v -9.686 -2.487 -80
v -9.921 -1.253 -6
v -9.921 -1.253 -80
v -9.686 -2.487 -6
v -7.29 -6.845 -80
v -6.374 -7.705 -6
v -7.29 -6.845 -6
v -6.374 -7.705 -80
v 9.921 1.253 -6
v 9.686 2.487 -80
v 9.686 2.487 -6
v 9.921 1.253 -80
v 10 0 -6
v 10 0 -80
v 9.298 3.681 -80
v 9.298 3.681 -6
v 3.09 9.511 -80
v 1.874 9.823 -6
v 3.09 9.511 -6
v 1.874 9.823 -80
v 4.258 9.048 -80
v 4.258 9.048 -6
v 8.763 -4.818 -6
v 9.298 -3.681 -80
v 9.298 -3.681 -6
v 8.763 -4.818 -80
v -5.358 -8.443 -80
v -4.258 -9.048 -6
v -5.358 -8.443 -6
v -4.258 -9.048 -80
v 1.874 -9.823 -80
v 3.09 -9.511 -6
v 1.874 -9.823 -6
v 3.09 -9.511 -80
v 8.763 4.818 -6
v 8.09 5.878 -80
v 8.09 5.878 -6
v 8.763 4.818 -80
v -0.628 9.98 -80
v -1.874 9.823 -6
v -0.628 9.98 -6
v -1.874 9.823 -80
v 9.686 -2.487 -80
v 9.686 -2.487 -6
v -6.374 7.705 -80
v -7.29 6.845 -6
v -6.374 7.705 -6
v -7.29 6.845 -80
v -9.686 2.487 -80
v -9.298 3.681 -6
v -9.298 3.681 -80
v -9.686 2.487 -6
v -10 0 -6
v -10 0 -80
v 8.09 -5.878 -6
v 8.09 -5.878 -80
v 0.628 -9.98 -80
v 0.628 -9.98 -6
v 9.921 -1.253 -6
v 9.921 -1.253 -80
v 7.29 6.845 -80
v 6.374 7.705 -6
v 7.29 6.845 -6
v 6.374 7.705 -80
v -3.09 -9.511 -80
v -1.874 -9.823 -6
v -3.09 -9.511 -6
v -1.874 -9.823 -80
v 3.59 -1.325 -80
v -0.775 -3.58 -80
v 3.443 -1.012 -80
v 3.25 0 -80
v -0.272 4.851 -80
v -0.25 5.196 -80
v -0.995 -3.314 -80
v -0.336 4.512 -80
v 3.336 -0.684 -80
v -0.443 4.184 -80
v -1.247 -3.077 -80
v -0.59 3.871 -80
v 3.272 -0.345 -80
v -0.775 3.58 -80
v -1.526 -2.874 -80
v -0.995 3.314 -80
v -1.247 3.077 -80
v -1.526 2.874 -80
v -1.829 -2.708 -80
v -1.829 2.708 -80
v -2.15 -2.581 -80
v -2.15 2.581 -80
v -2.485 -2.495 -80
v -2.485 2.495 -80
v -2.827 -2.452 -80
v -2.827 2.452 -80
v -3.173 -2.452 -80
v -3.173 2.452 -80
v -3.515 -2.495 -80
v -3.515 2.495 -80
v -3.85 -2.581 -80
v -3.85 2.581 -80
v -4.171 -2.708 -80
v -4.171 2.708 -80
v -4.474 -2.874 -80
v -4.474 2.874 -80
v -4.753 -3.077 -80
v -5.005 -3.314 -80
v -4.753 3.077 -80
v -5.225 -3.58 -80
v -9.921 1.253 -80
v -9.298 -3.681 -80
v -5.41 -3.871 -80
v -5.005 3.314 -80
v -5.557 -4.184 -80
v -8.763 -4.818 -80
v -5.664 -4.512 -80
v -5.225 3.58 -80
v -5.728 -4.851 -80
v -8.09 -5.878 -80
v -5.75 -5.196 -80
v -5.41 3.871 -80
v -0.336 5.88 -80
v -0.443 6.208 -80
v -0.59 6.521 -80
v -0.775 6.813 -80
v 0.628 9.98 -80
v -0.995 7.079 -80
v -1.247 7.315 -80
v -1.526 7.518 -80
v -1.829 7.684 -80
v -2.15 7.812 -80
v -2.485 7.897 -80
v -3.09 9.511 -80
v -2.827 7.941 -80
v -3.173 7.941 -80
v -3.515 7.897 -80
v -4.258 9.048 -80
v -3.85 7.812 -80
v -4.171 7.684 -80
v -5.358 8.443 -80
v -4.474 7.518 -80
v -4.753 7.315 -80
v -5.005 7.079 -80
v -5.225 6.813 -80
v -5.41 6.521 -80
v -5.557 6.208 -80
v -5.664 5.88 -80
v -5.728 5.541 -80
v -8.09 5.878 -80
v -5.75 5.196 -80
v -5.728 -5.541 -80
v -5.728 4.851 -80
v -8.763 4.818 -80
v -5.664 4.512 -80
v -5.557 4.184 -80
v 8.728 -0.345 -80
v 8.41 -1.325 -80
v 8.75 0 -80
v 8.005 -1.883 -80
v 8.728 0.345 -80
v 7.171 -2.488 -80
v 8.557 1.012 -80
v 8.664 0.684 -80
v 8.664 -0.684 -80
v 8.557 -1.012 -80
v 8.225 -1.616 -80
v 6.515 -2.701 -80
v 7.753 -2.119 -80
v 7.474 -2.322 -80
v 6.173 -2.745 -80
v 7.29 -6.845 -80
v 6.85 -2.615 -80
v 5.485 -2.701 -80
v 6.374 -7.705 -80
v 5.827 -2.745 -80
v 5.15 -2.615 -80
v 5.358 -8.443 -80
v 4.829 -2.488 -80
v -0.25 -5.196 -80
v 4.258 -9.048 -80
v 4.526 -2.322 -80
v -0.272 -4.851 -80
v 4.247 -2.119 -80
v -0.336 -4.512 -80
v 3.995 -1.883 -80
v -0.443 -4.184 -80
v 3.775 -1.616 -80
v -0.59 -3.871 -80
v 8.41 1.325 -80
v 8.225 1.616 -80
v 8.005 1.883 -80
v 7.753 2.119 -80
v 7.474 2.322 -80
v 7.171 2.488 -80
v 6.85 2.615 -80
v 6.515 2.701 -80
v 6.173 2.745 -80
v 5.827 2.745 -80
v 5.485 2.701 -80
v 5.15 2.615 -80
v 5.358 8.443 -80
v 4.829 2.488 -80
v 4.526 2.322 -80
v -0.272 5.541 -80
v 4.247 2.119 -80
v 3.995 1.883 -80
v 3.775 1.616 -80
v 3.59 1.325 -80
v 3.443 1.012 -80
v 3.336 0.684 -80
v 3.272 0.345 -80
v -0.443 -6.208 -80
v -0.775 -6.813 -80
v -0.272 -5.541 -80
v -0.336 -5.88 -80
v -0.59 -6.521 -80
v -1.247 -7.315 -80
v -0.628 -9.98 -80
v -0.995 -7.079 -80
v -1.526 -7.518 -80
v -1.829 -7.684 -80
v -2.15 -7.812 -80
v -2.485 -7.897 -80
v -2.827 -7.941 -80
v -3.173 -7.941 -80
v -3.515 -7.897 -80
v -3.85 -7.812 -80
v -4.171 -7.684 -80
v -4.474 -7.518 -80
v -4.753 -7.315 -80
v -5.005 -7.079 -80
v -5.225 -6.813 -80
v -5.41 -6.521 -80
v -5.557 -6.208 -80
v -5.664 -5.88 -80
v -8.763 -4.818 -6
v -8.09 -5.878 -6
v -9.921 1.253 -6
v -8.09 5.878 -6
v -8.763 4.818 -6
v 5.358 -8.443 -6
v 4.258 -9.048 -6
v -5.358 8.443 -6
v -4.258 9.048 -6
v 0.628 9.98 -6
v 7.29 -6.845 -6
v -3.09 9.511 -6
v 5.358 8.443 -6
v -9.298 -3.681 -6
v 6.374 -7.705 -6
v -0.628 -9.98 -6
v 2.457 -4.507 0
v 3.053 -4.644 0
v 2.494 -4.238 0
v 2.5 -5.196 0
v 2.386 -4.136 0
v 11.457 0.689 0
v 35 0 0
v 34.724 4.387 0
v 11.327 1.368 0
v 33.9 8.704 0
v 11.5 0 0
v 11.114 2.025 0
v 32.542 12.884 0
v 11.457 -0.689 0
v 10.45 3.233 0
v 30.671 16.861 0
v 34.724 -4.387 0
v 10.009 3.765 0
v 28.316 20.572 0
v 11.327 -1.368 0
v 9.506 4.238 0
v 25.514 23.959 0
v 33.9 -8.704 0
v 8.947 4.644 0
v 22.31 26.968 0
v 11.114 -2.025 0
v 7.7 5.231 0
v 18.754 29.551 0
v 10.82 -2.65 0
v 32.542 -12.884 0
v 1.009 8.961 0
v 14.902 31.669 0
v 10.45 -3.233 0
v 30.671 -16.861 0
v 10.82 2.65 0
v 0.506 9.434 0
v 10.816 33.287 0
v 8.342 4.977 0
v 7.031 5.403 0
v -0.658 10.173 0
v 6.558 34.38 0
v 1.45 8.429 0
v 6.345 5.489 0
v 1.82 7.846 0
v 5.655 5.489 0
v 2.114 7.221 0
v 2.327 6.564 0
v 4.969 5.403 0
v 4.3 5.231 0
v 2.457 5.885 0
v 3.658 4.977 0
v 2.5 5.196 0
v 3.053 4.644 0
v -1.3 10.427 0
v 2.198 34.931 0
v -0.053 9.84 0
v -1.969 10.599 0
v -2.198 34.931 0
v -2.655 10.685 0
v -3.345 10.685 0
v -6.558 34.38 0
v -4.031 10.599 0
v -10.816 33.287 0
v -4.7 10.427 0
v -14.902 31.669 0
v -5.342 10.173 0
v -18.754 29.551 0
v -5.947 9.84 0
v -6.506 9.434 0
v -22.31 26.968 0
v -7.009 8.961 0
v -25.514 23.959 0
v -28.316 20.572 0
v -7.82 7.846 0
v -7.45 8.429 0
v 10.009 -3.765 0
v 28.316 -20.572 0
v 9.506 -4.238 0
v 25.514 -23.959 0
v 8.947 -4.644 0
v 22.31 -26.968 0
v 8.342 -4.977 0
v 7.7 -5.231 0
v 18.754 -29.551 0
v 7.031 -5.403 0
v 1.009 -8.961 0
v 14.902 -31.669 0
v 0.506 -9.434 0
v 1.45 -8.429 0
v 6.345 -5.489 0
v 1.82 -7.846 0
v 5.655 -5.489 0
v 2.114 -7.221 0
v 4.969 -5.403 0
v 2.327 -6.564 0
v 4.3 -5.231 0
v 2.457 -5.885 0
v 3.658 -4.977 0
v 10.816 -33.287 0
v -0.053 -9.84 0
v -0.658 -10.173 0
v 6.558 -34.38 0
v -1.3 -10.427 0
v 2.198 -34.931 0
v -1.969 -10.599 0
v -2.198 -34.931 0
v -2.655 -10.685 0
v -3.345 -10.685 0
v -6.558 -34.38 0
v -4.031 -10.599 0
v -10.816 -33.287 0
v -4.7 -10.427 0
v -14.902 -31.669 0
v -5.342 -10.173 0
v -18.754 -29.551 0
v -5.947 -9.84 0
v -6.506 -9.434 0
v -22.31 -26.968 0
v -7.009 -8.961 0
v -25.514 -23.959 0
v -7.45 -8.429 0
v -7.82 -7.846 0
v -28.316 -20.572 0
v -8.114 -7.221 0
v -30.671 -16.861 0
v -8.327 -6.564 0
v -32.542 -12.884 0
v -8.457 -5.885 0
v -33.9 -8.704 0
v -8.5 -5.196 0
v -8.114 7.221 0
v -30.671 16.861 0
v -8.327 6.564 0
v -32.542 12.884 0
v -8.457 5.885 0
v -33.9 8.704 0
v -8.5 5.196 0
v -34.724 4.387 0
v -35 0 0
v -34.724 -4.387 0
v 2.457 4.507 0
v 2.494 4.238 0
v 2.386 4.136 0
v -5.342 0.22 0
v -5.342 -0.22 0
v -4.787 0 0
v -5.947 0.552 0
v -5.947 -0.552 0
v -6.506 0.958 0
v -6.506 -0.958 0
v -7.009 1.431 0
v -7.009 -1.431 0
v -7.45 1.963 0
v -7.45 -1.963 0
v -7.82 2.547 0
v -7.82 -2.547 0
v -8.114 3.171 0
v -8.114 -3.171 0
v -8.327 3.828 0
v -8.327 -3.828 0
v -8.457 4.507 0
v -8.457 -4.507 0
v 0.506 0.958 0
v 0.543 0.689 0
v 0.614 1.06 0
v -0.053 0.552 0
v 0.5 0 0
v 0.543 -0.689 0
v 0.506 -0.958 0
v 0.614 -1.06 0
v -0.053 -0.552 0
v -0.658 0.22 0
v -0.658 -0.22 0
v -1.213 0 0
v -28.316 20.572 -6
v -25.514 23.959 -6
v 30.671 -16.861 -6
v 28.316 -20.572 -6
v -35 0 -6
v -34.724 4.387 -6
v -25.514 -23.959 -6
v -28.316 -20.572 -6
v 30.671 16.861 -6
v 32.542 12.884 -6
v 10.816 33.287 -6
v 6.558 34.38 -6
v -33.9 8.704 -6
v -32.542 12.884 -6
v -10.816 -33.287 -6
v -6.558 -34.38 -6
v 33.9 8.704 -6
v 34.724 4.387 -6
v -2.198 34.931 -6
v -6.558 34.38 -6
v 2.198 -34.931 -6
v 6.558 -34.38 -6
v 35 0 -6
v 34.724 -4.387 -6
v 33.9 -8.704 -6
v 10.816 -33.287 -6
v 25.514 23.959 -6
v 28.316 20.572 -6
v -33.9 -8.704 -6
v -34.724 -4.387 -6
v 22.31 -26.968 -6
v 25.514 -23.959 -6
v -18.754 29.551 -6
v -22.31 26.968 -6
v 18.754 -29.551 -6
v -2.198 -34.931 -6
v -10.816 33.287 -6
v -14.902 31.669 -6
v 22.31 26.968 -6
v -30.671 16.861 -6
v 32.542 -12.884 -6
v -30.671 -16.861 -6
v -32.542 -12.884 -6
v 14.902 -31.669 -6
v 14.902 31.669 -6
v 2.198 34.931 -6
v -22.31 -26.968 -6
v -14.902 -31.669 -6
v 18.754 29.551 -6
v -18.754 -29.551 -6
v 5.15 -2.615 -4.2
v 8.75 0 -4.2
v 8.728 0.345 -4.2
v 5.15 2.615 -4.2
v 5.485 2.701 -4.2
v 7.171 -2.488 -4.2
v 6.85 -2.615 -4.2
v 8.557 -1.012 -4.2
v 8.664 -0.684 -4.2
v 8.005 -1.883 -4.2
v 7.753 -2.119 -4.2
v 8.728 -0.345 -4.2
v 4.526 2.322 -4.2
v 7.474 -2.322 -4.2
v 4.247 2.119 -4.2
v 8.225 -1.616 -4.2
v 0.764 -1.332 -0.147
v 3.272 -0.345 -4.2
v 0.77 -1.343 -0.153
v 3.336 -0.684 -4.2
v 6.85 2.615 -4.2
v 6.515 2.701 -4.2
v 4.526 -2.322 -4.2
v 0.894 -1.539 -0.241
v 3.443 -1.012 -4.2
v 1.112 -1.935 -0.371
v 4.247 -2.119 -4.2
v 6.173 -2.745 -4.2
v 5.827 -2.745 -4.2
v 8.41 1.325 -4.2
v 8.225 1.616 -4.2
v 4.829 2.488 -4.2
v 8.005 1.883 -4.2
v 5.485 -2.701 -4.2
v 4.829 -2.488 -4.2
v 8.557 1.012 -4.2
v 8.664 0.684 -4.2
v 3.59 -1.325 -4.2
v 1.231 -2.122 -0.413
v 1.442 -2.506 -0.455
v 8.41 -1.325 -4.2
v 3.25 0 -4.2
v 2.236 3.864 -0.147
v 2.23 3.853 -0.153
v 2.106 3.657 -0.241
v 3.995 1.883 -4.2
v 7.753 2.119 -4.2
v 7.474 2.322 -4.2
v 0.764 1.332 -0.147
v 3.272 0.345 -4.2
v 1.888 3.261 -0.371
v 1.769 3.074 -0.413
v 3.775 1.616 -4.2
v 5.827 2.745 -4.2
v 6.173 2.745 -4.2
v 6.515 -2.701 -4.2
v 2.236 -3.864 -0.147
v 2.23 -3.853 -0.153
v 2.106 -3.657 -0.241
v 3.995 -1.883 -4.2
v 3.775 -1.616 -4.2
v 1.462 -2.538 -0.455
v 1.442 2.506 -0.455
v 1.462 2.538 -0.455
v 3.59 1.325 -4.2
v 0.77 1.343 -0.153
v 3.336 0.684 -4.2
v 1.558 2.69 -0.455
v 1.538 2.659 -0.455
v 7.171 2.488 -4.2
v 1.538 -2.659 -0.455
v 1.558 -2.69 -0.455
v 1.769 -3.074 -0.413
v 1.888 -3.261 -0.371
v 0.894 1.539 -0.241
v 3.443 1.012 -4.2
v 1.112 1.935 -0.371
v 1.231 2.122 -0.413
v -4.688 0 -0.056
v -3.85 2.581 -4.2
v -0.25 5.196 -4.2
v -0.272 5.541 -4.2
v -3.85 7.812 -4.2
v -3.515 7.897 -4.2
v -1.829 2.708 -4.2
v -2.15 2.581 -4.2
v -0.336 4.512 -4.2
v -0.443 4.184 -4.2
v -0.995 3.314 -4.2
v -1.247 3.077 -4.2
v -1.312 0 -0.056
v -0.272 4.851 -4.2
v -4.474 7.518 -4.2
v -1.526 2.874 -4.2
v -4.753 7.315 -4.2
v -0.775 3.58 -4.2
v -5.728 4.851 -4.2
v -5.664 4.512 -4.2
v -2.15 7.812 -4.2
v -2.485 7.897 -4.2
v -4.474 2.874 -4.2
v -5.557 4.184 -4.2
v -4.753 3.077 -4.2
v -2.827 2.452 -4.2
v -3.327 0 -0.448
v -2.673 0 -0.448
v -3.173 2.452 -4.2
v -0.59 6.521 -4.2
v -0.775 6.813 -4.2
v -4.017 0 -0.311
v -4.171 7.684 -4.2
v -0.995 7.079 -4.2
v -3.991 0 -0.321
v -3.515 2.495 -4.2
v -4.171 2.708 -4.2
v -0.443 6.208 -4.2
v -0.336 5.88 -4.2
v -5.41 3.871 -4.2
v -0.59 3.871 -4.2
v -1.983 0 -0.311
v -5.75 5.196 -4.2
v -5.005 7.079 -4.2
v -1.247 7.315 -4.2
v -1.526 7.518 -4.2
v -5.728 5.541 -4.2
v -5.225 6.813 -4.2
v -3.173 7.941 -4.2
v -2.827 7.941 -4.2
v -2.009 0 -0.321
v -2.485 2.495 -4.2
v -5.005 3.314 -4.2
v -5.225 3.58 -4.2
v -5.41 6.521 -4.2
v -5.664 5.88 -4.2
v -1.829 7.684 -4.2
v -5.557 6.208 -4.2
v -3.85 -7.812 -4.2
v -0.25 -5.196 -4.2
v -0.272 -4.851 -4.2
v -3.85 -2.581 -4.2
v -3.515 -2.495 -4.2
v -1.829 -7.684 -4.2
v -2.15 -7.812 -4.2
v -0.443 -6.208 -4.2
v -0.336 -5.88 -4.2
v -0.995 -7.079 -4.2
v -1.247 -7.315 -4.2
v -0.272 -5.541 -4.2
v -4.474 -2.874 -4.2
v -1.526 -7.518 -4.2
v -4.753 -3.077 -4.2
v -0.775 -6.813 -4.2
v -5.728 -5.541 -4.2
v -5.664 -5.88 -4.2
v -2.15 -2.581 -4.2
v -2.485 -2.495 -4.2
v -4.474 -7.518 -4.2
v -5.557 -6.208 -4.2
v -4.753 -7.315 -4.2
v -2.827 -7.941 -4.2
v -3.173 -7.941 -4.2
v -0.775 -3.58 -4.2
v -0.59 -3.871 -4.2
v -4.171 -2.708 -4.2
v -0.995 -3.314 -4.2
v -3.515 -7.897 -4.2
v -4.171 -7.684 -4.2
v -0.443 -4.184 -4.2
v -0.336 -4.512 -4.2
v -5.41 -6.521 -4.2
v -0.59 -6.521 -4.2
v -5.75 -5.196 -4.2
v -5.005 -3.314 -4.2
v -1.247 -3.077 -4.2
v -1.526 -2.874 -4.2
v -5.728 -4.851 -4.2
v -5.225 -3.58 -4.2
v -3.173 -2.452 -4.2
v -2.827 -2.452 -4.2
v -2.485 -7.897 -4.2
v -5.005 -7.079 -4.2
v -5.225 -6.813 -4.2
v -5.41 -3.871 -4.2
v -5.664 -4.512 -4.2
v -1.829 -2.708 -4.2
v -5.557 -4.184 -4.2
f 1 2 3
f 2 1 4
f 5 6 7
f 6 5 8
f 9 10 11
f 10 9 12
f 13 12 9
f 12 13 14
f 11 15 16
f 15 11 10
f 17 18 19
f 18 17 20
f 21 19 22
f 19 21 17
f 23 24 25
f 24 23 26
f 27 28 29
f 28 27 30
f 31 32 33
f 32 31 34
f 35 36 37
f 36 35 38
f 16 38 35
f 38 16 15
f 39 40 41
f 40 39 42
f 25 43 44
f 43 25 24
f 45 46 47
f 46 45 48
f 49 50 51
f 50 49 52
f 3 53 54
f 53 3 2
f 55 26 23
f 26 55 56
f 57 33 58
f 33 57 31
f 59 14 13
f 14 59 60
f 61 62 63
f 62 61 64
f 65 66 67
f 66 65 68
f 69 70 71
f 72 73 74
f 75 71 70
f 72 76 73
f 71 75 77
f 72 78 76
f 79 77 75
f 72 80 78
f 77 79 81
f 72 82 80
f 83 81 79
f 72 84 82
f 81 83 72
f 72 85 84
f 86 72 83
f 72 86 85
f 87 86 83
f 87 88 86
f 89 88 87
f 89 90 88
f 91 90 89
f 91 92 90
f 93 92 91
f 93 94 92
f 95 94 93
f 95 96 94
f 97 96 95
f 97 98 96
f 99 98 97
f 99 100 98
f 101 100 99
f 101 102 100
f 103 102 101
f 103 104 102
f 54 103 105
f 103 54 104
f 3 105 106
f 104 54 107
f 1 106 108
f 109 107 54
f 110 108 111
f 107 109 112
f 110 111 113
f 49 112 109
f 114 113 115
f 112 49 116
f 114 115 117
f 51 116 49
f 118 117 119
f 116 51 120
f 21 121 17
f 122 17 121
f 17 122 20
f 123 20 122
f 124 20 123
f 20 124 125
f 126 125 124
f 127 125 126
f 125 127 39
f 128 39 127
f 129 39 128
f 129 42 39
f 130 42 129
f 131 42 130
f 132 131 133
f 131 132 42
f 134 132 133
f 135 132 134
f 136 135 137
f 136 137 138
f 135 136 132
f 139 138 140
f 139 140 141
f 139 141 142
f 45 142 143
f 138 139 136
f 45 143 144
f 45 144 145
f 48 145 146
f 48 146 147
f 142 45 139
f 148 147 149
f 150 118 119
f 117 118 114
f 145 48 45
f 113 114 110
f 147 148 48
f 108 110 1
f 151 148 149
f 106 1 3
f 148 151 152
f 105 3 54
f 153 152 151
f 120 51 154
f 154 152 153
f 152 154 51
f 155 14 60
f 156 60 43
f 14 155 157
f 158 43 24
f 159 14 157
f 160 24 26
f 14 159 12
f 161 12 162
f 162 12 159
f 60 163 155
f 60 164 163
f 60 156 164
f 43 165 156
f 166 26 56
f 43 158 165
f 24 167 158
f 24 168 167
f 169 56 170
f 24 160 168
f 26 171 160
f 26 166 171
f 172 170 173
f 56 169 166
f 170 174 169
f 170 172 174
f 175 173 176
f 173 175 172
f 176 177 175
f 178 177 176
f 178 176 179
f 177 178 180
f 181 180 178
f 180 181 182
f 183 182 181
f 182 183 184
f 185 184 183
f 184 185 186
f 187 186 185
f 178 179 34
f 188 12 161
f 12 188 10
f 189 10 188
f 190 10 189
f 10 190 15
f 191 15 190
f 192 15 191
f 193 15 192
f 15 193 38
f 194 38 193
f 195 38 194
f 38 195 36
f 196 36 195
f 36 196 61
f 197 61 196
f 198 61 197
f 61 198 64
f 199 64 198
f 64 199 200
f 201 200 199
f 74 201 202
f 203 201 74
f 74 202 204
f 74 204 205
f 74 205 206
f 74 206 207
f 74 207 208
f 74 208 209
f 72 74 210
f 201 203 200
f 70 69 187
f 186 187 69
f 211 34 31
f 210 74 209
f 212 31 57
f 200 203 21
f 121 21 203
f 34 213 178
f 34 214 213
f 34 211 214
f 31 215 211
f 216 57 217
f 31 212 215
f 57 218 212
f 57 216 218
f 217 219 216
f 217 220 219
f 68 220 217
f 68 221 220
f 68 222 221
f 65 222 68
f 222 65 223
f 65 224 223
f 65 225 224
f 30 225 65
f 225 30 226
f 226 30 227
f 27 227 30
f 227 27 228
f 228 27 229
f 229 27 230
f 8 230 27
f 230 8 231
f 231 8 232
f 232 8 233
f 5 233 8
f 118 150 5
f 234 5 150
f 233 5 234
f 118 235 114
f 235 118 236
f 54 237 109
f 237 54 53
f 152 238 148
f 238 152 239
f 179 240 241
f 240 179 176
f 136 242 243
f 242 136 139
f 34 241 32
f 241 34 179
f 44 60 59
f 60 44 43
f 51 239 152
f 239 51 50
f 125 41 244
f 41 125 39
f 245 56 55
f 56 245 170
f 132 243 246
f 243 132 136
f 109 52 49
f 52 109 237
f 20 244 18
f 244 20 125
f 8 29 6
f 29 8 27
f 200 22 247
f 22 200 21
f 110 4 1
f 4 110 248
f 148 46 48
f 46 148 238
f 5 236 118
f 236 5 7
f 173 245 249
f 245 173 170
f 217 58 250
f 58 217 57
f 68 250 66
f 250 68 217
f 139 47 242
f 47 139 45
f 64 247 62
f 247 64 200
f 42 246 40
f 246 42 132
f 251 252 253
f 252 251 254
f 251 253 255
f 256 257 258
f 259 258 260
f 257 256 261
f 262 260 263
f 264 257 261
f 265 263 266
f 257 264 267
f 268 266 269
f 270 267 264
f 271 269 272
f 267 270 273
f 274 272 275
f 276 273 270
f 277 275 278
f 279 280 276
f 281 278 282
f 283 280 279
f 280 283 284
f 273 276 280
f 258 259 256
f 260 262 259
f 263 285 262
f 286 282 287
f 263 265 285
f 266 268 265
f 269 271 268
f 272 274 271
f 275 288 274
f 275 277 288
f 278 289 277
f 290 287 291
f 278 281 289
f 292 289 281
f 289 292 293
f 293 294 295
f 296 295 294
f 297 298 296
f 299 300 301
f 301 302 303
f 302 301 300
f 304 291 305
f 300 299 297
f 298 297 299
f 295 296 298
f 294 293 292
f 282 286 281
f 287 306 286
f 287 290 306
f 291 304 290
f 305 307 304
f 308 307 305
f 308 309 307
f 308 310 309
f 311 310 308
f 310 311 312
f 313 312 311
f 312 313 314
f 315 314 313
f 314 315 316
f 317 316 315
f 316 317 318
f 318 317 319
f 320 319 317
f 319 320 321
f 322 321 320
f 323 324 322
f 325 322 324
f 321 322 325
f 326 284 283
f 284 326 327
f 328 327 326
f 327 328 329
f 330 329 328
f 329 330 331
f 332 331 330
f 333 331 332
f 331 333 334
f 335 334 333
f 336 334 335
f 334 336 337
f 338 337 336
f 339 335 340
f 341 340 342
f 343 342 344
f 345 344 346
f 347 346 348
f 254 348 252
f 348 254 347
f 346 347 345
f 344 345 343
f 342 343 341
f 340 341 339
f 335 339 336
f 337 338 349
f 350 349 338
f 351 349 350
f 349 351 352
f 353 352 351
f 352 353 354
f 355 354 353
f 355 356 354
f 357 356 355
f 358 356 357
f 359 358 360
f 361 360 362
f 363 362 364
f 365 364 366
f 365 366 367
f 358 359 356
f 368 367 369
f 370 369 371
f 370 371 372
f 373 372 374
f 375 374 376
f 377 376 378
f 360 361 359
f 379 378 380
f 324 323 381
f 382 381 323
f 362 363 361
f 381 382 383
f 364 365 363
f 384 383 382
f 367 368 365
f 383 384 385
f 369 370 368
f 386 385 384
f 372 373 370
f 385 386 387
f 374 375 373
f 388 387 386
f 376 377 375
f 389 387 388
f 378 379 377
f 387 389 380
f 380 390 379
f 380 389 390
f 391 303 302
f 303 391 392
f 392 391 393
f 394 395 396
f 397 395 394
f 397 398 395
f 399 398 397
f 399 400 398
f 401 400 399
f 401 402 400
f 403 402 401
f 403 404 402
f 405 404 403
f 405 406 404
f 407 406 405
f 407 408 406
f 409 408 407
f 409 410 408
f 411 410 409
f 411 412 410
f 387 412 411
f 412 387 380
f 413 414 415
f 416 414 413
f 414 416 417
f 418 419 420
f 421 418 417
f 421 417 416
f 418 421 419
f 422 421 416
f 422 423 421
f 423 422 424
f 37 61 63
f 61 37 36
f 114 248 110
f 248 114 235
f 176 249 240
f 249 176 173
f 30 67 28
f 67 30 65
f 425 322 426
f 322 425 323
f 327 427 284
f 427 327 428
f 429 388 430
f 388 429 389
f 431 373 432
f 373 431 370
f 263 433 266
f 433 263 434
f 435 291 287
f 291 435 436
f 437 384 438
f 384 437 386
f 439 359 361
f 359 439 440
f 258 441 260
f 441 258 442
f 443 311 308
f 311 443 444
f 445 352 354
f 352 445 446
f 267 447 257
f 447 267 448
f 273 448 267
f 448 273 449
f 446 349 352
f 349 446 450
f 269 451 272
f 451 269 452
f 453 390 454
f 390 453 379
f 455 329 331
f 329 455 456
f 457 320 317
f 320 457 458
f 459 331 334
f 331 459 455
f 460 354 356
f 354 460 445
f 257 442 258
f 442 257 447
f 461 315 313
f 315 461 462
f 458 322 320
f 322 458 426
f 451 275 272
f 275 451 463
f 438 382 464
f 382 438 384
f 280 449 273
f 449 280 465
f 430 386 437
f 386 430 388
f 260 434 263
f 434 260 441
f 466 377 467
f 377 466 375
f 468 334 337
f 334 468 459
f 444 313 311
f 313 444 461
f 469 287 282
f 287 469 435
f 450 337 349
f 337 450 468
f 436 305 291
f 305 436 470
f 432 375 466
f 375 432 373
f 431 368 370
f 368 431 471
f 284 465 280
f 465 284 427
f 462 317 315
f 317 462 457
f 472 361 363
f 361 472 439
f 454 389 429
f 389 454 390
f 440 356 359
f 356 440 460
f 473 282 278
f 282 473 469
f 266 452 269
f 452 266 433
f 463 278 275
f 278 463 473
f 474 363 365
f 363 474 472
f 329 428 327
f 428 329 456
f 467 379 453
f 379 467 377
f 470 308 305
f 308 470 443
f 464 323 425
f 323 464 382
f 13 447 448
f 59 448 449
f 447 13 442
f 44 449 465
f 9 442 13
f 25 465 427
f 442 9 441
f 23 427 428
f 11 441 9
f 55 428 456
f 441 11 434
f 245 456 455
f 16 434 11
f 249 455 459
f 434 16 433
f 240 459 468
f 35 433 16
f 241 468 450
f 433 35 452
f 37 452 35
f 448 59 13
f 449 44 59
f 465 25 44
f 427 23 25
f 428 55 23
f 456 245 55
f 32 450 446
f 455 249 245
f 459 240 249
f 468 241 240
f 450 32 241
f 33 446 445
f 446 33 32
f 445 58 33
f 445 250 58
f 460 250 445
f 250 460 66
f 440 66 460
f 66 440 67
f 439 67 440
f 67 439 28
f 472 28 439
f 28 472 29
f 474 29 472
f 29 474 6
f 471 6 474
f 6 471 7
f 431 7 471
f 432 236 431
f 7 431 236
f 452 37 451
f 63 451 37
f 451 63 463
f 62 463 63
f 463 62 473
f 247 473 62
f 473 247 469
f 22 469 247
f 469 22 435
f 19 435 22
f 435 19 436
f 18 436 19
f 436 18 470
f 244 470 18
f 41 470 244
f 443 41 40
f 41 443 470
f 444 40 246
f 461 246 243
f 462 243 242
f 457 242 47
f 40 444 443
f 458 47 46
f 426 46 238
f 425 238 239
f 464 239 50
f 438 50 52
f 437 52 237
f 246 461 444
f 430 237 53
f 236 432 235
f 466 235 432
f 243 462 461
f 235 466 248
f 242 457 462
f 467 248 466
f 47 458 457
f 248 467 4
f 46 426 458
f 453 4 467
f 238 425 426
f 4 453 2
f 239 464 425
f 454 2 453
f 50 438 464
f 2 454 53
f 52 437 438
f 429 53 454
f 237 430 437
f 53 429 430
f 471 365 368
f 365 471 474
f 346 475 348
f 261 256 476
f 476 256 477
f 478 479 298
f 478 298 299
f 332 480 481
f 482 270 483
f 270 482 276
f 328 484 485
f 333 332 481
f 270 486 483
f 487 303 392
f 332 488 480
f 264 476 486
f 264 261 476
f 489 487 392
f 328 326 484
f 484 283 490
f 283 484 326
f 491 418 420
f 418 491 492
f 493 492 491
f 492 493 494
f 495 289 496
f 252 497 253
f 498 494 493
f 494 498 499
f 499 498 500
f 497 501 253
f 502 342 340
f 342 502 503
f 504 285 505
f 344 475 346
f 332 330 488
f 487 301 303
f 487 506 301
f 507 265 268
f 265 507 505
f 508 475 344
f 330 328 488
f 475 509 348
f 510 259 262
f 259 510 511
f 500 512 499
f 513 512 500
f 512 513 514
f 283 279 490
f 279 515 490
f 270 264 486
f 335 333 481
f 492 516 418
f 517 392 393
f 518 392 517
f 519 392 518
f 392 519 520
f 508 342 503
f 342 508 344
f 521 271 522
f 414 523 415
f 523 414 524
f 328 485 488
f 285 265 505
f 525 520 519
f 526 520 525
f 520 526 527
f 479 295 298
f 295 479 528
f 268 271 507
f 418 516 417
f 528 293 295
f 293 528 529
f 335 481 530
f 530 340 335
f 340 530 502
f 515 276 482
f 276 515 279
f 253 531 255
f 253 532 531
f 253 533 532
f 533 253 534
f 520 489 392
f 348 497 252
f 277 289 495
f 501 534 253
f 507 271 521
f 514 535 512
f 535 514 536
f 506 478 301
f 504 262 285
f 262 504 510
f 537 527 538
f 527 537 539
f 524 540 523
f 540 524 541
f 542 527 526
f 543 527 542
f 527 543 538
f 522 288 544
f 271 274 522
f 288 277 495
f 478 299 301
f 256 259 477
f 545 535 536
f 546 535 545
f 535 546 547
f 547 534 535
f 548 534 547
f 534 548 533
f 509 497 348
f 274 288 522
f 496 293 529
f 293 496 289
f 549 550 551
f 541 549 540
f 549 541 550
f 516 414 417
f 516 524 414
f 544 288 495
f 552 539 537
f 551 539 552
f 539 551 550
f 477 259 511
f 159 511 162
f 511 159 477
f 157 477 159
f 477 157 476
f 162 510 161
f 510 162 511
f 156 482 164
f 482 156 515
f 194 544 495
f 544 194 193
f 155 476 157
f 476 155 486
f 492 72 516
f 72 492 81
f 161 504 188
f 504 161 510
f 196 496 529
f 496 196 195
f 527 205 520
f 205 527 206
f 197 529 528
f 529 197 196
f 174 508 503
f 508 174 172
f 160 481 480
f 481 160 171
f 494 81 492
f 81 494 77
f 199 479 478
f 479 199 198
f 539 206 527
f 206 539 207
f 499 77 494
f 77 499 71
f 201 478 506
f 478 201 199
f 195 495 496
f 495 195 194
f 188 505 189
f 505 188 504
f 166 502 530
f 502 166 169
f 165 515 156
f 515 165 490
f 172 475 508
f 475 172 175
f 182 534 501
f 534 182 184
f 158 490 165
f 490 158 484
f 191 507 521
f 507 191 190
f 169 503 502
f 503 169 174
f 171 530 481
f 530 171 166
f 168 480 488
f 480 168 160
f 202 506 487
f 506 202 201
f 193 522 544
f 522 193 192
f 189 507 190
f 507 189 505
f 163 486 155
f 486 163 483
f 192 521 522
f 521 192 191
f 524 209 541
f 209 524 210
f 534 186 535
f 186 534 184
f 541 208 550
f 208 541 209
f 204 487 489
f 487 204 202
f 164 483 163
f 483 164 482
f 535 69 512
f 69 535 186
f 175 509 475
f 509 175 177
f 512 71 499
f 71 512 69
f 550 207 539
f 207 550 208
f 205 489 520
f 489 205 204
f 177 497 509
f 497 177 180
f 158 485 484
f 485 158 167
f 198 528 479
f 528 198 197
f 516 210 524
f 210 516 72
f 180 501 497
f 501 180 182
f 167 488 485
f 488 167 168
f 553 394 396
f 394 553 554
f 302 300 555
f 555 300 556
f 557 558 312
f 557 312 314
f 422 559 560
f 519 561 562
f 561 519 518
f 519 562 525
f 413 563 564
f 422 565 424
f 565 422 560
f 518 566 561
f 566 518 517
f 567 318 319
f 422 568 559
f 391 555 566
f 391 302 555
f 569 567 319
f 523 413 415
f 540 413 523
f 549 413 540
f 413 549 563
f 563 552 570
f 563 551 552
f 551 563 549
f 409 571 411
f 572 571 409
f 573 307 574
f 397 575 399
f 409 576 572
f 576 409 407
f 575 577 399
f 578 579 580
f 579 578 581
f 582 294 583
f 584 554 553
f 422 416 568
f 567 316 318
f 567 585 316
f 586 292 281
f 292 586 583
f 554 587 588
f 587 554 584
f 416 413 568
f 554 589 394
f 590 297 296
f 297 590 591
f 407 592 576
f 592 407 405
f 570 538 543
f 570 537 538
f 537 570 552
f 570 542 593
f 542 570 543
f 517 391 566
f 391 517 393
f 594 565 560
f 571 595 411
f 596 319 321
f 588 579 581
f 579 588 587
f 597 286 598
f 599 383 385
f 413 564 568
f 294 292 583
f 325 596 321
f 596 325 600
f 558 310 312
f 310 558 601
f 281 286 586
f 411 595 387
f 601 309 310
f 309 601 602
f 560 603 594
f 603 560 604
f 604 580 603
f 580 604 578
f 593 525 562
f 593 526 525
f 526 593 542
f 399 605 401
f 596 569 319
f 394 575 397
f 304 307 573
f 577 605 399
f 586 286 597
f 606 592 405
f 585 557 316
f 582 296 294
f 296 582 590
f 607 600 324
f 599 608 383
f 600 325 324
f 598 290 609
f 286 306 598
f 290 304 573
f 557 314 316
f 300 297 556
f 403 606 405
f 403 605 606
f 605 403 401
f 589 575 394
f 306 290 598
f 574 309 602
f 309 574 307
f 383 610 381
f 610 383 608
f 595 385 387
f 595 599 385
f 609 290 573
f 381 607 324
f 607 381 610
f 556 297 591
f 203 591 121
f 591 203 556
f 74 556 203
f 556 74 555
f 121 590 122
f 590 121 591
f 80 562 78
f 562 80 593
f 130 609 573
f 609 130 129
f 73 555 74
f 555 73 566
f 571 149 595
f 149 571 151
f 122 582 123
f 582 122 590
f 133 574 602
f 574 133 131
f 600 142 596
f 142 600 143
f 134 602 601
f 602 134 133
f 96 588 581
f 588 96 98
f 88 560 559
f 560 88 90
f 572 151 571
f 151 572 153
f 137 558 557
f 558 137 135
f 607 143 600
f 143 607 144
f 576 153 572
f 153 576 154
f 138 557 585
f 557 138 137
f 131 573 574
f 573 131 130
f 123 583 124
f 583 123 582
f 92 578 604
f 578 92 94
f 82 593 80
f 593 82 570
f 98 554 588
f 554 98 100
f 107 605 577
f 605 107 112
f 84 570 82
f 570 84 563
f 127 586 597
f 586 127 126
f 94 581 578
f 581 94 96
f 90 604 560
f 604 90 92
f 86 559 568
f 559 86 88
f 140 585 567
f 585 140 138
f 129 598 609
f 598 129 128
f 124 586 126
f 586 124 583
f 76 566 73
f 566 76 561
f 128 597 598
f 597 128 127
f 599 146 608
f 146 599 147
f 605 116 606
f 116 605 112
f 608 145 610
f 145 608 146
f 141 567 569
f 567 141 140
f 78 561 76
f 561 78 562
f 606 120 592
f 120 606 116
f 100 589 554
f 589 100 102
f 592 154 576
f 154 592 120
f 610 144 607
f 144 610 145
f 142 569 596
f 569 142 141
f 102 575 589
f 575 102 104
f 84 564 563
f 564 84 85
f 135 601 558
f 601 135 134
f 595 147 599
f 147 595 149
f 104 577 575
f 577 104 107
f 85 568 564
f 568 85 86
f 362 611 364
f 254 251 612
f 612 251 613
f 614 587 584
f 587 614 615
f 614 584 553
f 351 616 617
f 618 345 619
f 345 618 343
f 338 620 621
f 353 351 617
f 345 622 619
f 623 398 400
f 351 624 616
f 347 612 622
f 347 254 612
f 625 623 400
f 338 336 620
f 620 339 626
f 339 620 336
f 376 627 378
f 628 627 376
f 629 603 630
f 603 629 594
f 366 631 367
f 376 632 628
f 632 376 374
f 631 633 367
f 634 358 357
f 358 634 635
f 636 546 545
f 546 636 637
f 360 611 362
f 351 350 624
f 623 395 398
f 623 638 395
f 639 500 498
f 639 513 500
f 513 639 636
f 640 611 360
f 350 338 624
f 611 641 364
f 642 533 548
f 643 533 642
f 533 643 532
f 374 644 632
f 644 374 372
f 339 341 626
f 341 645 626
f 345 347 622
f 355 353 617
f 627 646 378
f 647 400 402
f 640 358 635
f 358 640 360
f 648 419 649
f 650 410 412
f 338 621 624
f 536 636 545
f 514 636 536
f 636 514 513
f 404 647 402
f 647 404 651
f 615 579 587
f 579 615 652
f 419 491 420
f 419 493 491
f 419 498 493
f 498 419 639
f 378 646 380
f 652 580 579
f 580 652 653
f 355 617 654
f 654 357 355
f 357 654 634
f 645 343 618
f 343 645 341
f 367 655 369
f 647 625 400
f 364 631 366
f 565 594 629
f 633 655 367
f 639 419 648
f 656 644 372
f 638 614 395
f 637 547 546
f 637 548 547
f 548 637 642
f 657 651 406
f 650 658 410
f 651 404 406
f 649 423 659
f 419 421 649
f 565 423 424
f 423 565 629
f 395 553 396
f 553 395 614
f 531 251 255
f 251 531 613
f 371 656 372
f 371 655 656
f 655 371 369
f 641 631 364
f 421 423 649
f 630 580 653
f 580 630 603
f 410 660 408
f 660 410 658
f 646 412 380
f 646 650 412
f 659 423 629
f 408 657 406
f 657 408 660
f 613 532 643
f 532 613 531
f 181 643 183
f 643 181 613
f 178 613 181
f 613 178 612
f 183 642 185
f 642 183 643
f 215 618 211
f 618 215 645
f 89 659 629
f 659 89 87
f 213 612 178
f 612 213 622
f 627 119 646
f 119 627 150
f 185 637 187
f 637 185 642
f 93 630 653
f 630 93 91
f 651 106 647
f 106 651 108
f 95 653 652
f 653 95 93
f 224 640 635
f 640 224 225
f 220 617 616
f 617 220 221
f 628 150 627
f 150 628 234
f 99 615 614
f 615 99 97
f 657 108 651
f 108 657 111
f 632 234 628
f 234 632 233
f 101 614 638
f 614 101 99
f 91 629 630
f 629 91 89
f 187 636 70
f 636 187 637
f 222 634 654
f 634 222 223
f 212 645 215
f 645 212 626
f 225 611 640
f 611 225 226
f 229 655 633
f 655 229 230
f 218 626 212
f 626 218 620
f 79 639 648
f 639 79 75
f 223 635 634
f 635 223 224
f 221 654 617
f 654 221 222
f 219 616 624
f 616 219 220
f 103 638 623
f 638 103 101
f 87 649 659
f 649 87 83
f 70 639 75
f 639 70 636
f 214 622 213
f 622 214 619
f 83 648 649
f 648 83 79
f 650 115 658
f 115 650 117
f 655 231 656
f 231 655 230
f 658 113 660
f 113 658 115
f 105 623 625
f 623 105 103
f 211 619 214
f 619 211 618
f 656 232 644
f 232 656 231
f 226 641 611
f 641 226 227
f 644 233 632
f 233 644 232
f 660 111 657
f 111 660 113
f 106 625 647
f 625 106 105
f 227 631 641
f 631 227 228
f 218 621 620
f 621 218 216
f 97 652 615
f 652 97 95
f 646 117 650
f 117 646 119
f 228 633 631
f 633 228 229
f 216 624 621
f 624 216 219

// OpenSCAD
$fn = 50;


difference() {
	union() {
		translate(v = [0, 0, -80.0000000000]) {
			cylinder(h = 80, r = 10.0000000000);
		}
		translate(v = [0, 0, -6.0000000000]) {
			cylinder(h = 6, r = 35.0000000000);
		}
	}
	union() {
		translate(v = [6.0000000000, 0.0000000000, 0]) {
			rotate(a = [0, 0, 0]) {
				difference() {
					union() {
						#translate(v = [0, 0, -80.0000000000]) {
							cylinder(h = 80, r = 2.2500000000);
						}
						#translate(v = [0, 0, -4.2000000000]) {
							cylinder(h = 4.2000000000, r = 10.0000000000, r1 = 2.7500000000, r2 = 5.5000000000);
						}
						#translate(v = [0, 0, -80.0000000000]) {
							cylinder(h = 80, r = 2.7500000000);
						}
						#translate(v = [0, 0, -80.0000000000]) {
							cylinder(h = 80, r = 2.2500000000);
						}
					}
					union();
				}
			}
		}
		translate(v = [-3.0000000000, 5.1961524227, 0]) {
			rotate(a = [0, 0, 0]) {
				difference() {
					union() {
						#translate(v = [0, 0, -80.0000000000]) {
							cylinder(h = 80, r = 2.2500000000);
						}
						#translate(v = [0, 0, -4.2000000000]) {
							cylinder(h = 4.2000000000, r = 10.0000000000, r1 = 2.7500000000, r2 = 5.5000000000);
						}
						#translate(v = [0, 0, -80.0000000000]) {
							cylinder(h = 80, r = 2.7500000000);
						}
						#translate(v = [0, 0, -80.0000000000]) {
							cylinder(h = 80, r = 2.2500000000);
						}
					}
					union();
				}
			}
		}
		translate(v = [-3.0000000000, -5.1961524227, 0]) {
			rotate(a = [0, 0, 0]) {
				difference() {
					union() {
						#translate(v = [0, 0, -80.0000000000]) {
							cylinder(h = 80, r = 2.2500000000);
						}
						#translate(v = [0, 0, -4.2000000000]) {
							cylinder(h = 4.2000000000, r = 10.0000000000, r1 = 2.7500000000, r2 = 5.5000000000);
						}
						#translate(v = [0, 0, -80.0000000000]) {
							cylinder(h = 80, r = 2.7500000000);
						}
						#translate(v = [0, 0, -80.0000000000]) {
							cylinder(h = 80, r = 2.2500000000);
						}
					}
					union();
				}
			}
		}
	}
}
